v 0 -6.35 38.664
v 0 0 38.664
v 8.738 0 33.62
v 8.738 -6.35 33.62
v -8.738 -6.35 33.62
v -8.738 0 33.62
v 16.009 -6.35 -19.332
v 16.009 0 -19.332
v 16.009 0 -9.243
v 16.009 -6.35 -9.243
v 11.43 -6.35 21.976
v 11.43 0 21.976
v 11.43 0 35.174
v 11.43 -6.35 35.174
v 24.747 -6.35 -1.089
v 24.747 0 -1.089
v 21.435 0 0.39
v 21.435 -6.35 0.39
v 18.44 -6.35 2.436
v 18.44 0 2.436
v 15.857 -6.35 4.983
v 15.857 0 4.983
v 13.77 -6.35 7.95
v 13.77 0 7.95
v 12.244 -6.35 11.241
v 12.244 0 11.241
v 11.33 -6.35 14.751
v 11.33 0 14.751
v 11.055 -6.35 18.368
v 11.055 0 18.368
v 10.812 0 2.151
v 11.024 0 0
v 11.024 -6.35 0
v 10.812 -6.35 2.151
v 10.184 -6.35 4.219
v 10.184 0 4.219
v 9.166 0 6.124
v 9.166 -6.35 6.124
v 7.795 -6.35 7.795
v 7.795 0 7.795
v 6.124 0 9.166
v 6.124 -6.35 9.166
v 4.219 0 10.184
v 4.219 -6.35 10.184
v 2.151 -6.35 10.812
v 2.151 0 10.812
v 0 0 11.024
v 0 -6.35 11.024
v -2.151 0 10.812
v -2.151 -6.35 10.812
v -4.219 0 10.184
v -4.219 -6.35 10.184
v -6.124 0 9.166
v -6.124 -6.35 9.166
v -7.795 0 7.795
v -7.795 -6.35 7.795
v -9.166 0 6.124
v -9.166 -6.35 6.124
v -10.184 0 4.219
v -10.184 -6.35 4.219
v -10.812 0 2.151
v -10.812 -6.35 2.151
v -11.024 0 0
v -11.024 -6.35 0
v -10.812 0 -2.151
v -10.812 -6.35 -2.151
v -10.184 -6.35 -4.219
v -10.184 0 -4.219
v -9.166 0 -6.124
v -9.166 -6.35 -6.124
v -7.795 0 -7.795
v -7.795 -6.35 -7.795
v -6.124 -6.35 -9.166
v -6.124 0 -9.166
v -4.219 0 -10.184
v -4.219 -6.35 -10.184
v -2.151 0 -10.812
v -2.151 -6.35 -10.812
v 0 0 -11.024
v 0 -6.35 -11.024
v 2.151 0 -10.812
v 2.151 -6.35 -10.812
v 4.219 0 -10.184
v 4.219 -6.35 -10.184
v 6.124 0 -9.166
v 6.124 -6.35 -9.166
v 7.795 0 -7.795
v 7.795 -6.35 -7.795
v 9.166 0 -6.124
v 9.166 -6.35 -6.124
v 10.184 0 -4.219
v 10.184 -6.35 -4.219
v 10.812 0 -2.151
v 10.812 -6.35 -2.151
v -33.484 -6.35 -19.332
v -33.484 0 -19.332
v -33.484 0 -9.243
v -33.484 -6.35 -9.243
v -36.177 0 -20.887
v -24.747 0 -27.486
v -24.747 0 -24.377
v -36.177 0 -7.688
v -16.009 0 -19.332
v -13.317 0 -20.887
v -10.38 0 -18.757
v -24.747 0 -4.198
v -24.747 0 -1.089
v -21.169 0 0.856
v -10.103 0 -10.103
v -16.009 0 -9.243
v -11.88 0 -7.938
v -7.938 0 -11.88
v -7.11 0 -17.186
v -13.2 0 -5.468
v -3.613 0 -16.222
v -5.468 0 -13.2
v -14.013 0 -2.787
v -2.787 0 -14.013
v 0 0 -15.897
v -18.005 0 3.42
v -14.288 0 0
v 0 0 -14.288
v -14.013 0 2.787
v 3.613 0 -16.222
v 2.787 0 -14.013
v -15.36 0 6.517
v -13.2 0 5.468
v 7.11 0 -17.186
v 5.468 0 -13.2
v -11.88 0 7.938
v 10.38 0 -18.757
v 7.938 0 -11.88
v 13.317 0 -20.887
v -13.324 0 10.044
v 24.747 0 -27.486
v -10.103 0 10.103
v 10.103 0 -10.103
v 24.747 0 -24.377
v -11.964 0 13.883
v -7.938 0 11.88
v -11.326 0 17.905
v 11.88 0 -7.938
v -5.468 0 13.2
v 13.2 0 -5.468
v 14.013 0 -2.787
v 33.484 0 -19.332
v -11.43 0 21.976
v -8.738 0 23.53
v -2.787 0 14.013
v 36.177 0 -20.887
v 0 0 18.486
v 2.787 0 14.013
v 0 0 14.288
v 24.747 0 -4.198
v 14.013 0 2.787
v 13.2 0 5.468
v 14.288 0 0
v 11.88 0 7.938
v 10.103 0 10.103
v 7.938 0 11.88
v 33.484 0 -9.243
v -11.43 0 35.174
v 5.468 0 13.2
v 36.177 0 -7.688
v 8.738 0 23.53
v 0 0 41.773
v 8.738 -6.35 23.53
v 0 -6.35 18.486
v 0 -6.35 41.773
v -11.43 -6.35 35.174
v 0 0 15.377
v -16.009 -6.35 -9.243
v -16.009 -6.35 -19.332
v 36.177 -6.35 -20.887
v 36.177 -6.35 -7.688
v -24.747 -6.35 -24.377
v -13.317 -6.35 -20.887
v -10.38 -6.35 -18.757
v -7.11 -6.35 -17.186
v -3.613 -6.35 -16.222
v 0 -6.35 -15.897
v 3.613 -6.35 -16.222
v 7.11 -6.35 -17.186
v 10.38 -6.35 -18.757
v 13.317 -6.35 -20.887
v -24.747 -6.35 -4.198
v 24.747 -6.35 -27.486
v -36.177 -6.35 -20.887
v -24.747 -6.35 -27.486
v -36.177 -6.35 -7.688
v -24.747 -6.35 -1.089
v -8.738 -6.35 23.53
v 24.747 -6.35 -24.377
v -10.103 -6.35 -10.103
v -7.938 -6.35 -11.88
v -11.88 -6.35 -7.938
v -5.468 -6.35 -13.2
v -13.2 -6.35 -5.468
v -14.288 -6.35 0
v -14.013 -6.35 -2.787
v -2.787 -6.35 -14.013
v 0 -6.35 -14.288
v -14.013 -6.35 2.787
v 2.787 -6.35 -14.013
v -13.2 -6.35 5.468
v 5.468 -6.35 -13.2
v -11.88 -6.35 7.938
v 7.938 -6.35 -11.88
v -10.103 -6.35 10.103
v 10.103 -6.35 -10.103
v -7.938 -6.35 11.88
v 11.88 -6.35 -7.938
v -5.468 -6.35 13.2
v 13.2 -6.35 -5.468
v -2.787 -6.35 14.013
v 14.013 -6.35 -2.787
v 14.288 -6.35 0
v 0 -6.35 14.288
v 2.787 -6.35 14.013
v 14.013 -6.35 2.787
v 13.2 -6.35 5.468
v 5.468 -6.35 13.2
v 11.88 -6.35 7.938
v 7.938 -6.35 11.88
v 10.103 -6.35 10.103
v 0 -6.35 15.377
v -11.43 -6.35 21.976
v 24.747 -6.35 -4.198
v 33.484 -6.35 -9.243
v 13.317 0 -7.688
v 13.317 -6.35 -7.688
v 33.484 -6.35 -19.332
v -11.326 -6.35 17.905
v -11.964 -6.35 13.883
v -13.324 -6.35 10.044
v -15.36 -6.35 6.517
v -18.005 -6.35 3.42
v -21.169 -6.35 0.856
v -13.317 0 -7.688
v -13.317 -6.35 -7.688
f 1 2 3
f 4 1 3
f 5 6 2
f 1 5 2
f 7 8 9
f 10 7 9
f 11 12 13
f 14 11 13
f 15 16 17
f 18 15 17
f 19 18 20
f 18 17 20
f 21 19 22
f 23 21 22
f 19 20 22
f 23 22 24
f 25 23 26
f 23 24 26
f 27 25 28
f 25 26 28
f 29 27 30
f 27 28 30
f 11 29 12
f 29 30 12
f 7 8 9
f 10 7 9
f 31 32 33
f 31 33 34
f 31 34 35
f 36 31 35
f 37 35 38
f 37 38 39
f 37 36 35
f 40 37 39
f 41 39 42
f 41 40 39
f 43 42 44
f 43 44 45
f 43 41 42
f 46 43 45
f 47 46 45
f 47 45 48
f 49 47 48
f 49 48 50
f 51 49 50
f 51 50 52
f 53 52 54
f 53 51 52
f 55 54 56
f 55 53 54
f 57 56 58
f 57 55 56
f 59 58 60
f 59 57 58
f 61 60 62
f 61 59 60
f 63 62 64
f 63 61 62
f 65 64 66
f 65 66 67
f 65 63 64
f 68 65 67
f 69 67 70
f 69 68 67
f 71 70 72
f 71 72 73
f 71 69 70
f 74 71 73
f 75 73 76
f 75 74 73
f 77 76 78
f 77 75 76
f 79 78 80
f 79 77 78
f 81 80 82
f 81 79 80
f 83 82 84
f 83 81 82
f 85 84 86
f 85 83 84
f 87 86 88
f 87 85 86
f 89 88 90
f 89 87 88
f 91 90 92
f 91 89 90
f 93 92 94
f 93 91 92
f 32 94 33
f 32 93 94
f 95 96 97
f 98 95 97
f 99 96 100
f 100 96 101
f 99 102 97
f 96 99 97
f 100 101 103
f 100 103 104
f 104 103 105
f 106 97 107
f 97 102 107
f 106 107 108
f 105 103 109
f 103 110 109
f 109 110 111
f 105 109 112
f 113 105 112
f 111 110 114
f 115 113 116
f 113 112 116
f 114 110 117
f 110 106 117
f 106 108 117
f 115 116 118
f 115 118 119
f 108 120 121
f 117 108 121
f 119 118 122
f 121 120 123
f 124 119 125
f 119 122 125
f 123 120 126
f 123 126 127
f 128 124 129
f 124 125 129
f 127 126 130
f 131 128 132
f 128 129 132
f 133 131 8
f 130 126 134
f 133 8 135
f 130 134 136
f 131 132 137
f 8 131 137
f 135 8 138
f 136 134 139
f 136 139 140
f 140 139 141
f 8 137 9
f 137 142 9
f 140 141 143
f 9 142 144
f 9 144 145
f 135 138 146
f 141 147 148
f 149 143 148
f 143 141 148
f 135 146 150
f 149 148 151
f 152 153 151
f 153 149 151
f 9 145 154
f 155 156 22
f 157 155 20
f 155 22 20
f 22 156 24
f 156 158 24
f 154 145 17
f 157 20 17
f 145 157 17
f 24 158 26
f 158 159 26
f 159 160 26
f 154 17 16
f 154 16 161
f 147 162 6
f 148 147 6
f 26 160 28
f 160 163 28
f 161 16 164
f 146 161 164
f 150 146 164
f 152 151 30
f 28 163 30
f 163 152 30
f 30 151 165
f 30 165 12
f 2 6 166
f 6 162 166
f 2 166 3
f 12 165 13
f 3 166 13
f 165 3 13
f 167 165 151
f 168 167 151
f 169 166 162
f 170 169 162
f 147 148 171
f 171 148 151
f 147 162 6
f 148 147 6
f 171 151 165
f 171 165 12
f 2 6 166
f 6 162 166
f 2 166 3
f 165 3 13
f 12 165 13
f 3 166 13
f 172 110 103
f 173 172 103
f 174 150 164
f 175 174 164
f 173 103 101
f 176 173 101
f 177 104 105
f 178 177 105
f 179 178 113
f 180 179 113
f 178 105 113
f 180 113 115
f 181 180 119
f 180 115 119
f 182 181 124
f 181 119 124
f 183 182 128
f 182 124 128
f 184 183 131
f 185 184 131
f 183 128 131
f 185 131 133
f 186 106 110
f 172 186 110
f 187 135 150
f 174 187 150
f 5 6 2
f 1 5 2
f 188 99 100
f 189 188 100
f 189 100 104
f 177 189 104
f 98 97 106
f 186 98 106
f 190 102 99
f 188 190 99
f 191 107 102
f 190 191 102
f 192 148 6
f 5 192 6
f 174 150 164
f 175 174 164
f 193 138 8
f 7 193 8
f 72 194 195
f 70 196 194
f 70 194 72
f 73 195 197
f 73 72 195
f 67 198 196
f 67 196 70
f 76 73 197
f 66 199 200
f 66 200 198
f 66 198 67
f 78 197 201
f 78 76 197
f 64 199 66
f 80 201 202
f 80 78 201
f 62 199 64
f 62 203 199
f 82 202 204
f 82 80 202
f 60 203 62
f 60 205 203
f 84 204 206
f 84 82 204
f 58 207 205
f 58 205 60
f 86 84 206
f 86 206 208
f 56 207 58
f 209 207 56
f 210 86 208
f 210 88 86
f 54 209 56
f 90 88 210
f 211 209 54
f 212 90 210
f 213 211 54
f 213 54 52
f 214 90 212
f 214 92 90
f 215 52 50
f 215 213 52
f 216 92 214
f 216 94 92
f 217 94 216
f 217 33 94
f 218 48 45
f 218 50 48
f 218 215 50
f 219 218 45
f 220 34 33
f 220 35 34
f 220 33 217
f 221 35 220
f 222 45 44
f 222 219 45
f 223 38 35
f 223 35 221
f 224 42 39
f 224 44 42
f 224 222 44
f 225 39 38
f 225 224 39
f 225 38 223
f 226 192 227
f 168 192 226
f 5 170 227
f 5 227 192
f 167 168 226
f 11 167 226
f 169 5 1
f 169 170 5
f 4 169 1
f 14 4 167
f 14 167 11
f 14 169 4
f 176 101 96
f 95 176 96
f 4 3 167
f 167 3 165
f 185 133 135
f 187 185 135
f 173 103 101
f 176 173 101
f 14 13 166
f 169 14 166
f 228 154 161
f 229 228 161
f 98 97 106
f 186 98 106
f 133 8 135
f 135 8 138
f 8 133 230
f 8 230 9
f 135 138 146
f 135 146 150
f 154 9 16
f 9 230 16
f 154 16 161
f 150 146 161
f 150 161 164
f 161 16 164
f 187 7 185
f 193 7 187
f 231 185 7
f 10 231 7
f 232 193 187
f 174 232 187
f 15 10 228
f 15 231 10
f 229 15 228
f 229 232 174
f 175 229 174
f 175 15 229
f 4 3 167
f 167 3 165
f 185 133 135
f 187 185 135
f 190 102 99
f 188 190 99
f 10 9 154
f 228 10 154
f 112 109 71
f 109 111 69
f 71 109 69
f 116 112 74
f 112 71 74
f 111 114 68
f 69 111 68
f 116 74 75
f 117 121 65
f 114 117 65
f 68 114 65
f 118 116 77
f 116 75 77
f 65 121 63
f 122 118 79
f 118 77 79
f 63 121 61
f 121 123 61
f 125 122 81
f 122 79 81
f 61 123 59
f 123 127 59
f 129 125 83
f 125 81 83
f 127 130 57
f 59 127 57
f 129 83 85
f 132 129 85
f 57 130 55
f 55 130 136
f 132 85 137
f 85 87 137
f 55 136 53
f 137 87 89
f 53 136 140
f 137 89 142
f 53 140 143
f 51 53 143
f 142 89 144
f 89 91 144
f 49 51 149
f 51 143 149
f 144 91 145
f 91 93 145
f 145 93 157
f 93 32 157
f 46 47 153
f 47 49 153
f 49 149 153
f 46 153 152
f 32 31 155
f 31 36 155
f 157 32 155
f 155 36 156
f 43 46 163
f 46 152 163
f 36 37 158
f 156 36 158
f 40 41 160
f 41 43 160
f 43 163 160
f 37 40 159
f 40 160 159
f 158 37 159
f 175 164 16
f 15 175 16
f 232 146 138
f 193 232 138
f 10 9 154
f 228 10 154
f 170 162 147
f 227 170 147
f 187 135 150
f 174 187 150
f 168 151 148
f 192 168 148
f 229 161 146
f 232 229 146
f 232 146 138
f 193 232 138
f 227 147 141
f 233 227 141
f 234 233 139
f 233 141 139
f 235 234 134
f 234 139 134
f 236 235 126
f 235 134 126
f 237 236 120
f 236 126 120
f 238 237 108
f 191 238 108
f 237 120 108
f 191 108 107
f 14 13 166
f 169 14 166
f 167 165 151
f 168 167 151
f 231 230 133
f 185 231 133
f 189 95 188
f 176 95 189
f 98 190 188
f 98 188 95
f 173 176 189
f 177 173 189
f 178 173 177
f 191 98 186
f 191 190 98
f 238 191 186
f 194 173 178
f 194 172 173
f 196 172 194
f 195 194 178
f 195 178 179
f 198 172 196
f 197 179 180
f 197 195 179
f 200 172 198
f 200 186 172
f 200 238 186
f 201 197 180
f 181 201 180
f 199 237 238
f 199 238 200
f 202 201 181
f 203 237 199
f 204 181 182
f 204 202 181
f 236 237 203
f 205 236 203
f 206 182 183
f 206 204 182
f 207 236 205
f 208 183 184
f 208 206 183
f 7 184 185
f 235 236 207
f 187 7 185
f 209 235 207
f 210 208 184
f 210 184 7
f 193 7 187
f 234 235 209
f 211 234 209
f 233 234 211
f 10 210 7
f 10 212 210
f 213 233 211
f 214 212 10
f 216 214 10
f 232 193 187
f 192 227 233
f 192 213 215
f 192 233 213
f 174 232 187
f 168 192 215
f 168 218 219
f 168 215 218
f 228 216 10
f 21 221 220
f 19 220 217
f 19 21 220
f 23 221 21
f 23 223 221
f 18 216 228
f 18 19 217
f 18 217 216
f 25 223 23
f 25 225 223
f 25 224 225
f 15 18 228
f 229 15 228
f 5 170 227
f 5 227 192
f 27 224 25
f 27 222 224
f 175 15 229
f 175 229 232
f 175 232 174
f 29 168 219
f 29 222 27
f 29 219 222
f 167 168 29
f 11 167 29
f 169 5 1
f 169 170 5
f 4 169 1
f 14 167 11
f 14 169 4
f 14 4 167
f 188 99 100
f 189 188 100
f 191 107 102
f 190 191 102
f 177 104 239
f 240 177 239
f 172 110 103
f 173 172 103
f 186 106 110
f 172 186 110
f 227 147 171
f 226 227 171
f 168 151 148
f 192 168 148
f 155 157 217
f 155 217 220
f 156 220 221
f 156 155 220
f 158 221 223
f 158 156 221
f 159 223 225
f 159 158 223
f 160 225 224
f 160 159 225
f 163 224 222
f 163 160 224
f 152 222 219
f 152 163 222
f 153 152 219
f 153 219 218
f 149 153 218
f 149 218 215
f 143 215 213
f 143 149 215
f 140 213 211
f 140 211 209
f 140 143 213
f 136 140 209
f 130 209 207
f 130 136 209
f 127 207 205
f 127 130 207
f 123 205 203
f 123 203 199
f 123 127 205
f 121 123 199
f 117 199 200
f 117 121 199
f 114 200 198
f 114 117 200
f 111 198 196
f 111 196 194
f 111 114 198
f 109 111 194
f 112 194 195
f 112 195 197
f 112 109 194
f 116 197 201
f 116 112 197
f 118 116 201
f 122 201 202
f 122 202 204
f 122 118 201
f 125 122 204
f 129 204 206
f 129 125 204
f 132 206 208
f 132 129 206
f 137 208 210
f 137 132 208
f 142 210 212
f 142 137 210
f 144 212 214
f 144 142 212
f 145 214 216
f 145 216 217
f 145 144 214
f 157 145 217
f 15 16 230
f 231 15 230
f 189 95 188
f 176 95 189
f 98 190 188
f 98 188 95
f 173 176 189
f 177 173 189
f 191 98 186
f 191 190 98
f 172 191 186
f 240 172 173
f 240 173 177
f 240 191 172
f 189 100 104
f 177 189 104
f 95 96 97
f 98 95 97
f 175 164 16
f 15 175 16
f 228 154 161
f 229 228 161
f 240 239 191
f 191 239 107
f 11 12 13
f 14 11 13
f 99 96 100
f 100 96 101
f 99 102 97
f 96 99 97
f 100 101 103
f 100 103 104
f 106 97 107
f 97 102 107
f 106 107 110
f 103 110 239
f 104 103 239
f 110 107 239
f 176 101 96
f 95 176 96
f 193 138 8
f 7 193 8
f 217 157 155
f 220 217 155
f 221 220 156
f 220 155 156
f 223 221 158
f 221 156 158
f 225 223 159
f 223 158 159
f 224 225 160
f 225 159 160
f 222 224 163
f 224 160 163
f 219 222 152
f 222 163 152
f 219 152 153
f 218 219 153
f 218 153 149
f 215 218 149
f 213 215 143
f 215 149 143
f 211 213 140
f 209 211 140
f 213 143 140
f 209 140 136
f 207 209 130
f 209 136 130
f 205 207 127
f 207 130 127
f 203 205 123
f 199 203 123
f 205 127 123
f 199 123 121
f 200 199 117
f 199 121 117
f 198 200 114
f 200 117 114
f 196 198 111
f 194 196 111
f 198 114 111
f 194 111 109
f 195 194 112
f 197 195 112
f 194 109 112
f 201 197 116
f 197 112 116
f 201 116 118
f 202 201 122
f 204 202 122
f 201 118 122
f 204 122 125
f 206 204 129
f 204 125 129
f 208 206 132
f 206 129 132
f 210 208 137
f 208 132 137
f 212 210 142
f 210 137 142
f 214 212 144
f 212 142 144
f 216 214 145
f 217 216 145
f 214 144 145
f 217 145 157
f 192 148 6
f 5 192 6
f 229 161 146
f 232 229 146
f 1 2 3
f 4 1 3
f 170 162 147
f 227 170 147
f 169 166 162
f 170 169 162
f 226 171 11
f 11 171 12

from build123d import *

# Parameters (mm, degrees)
F0_R     = 14.2875
F0_R_2   = 11.0236
F2_DEPTH = 6.35
F3_DEPTH = 6.35


with BuildPart() as f2:
    # F0 (on Front) → F2 (new body)
    with BuildSketch(Plane.XZ):
        Polygon((-13.316676, -7.688386), (-24.746676, -1.089273), (-36.176676, -7.688386), (-36.176676, -20.886614), (-24.746676, -27.485727), (-13.316676, -20.886614), align=None)
        Polygon((-16.009076, -19.332156), (-24.746676, -24.376811), (-33.484276, -19.332156), (-33.484276, -9.242844), (-24.746676, -4.198189), (-16.009076, -9.242844), align=None, mode=Mode.SUBTRACT)
        Polygon((36.176676, -7.688386), (24.746676, -1.089273), (13.316676, -7.688386), (13.316676, -20.886614), (24.746676, -27.485727), (36.176676, -20.886614), align=None)
        Polygon((24.746676, -4.198189), (33.484276, -9.242844), (33.484276, -19.332156), (24.746676, -24.376811), (16.009076, -19.332156), (16.009076, -9.242844), align=None, mode=Mode.SUBTRACT)
        Polygon((-11.43, 35.174114), (-11.43, 21.975886), (0, 15.376773), (11.43, 21.975886), (11.43, 35.174114), (0, 41.773227), align=None)
        Polygon((0, 18.485689), (-8.7376, 23.530344), (-8.7376, 33.619656), (0, 38.664311), (8.7376, 33.619656), (8.7376, 23.530344), align=None, mode=Mode.SUBTRACT)
        Circle(F0_R)
        Circle(F0_R_2, mode=Mode.SUBTRACT)
    extrude(amount=F2_DEPTH)


with BuildPart() as f3:
    # F0 (on Front) → F3 (new body)
    with BuildSketch(Plane.XZ):
        Polygon((-11.43, 35.174114), (-11.43, 21.975886), (0, 15.376773), (11.43, 21.975886), (11.43, 35.174114), (0, 41.773227), align=None)
        Polygon((0, 18.485689), (-8.7376, 23.530344), (-8.7376, 33.619656), (0, 38.664311), (8.7376, 33.619656), (8.7376, 23.530344), align=None, mode=Mode.SUBTRACT)
        with BuildLine():
            Line((0, 15.376773), (-11.43, 21.975886))
            ThreePointArc((-11.43, 21.975886), (-14.261571, 8.233922), (-24.746676, -1.089273))
            Line((-24.746676, -1.089273), (-13.316676, -7.688386))
            Line((-13.316676, -7.688386), (-13.316676, -20.886614))
            ThreePointArc((-13.316676, -20.886614), (0, -15.897326), (13.316676, -20.886614))
            Line((13.316676, -20.886614), (13.316676, -7.688386))
            Line((13.316676, -7.688386), (24.746676, -1.089273))
            ThreePointArc((24.746676, -1.089273), (13.769682, 7.949929), (11.43, 21.975886))
            Line((11.43, 21.975886), (0, 15.376773))
        make_face()
        Circle(F0_R, mode=Mode.SUBTRACT)
        Polygon((-13.316676, -7.688386), (-24.746676, -1.089273), (-36.176676, -7.688386), (-36.176676, -20.886614), (-24.746676, -27.485727), (-13.316676, -20.886614), align=None)
        Polygon((-16.009076, -19.332156), (-24.746676, -24.376811), (-33.484276, -19.332156), (-33.484276, -9.242844), (-24.746676, -4.198189), (-16.009076, -9.242844), align=None, mode=Mode.SUBTRACT)
        Polygon((36.176676, -7.688386), (24.746676, -1.089273), (13.316676, -7.688386), (13.316676, -20.886614), (24.746676, -27.485727), (36.176676, -20.886614), align=None)
        Polygon((24.746676, -4.198189), (33.484276, -9.242844), (33.484276, -19.332156), (24.746676, -24.376811), (16.009076, -19.332156), (16.009076, -9.242844), align=None, mode=Mode.SUBTRACT)
    extrude(amount=F3_DEPTH)


solid = Compound([f2.part, f3.part])
